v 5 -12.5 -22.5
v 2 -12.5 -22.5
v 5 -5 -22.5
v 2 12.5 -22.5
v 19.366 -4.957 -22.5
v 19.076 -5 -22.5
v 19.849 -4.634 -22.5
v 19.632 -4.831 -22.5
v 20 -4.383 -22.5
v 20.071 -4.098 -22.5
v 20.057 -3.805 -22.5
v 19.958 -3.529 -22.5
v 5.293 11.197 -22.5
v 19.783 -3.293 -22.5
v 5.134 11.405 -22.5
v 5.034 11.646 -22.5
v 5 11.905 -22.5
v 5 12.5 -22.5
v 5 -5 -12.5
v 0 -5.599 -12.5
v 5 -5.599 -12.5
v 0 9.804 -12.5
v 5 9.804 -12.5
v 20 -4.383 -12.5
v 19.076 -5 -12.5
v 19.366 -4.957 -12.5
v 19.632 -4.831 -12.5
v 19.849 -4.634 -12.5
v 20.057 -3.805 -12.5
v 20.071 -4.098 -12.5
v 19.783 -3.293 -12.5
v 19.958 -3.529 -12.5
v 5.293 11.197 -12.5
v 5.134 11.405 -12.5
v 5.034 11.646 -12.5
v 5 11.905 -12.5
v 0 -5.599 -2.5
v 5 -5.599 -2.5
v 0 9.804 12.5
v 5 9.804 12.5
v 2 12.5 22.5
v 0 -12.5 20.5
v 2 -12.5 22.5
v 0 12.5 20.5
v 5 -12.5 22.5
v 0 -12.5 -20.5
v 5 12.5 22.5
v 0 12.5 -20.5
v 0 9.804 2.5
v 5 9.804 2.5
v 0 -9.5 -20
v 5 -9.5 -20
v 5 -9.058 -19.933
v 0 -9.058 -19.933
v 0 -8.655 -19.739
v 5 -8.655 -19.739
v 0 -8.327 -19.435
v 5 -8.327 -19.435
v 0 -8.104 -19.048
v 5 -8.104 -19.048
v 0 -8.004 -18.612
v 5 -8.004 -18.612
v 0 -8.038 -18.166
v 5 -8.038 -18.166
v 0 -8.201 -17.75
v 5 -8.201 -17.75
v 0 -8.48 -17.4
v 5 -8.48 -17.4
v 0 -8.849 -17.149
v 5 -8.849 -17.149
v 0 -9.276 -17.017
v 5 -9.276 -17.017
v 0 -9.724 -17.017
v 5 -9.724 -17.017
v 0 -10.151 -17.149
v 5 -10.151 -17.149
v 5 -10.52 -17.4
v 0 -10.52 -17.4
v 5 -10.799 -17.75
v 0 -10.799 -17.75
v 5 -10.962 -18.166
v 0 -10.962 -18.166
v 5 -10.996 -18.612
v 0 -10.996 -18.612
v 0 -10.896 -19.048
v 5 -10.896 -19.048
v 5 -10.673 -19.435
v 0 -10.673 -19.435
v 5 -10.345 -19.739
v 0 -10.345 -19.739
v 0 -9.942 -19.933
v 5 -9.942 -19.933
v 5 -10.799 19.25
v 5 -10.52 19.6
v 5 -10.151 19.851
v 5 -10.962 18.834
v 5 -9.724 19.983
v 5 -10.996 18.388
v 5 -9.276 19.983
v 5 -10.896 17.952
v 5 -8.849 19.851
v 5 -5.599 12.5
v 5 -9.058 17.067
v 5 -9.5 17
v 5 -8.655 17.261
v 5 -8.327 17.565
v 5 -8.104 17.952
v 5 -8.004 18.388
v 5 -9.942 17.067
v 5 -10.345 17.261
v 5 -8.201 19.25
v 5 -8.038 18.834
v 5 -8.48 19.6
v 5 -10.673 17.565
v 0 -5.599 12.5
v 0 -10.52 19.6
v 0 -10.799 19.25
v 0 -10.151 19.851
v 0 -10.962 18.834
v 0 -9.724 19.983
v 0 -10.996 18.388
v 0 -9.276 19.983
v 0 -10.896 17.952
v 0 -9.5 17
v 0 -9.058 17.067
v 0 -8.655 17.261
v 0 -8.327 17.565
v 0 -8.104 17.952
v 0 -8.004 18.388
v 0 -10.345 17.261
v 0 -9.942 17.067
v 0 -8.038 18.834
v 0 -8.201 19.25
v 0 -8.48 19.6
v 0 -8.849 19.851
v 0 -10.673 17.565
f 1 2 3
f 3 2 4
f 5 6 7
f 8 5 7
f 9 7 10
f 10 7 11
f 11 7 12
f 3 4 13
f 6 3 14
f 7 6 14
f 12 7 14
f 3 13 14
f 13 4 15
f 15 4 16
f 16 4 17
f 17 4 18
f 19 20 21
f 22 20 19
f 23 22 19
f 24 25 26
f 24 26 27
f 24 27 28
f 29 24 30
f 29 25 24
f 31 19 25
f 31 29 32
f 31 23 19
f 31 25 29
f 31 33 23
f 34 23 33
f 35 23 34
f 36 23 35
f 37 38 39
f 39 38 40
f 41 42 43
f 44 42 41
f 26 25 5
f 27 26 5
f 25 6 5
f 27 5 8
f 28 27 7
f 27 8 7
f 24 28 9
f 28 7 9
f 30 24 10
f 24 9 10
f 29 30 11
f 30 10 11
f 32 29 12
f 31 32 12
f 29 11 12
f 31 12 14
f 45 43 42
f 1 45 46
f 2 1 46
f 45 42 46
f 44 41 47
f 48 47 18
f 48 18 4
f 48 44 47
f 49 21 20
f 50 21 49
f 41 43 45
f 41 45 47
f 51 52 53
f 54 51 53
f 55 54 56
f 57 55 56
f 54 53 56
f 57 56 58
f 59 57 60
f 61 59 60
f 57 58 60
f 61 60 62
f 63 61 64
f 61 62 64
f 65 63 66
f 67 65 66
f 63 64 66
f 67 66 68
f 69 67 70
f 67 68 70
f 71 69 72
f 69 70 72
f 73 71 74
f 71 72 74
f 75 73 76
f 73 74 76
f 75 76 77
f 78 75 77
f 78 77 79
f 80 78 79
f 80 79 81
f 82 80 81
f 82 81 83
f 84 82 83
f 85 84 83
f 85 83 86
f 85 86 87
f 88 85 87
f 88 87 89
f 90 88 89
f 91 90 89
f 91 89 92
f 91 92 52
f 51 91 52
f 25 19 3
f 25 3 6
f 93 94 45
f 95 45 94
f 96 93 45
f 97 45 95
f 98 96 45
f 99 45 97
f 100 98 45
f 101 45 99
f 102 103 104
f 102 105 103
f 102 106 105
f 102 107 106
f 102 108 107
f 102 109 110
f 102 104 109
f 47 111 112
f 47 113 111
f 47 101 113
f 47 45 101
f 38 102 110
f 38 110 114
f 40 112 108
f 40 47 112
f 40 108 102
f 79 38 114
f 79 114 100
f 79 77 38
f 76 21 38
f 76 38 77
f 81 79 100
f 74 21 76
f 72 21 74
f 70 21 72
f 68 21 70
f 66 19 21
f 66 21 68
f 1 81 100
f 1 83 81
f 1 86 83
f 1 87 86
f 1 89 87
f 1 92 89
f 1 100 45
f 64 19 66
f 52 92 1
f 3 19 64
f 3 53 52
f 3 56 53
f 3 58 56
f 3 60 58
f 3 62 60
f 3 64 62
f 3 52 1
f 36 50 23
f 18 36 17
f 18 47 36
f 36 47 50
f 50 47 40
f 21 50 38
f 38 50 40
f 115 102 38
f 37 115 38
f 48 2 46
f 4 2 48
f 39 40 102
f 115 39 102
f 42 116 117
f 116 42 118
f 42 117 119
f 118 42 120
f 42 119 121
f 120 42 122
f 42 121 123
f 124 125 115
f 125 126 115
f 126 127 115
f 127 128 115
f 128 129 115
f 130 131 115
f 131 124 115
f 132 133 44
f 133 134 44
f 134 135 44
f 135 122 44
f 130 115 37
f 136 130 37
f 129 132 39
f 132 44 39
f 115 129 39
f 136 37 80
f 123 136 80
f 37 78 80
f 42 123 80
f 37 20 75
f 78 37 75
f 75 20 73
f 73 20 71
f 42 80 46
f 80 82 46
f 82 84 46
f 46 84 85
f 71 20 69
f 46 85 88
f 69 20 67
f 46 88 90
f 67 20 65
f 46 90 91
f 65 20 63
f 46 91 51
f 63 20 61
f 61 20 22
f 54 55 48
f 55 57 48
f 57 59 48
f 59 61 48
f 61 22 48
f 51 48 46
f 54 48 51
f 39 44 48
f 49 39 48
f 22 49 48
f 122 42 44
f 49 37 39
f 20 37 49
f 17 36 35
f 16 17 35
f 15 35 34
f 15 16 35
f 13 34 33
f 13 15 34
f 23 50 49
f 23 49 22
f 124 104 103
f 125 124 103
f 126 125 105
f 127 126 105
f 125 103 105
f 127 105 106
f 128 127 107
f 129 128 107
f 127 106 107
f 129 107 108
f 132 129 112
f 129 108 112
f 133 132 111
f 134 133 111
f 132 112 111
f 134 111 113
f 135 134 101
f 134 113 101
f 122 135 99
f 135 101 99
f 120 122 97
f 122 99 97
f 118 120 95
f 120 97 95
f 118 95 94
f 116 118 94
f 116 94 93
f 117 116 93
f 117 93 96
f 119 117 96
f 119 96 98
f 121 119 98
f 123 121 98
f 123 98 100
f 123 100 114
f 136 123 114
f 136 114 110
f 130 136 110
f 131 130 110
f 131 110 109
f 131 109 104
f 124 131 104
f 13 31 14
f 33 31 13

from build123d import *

# Parameters (mm, degrees)
SKETCH1_W           = 45
SKETCH1_H           = 25
BOSS_EXTRUDE1_DEPTH = 5
SKETCH2_R           = 1.5
CUT_EXTRUDE1_DEPTH  = 27.220221204
CUT_EXTRUDE2_DEPTH  = 27.220221204
CHAMFER2_SIZE       = 2
BOSS_EXTRUDE2_START = -10
BOSS_EXTRUDE2_DEPTH = 10
FILLET1_R           = 1


with BuildPart() as part:
    # Sketch1 → Boss-Extrude1 (new body)
    with BuildSketch(Plane(origin=(0, 0, 0), x_dir=(0, 0, -1), z_dir=(1, 0, 0))):
        Rectangle(SKETCH1_W, SKETCH1_H)
    extrude(amount=BOSS_EXTRUDE1_DEPTH)

    # Sketch2 → Cut-Extrude1 (cut, through all)
    with BuildSketch(Plane(origin=(5, 0, 0), x_dir=(0, 0, -1), z_dir=(1, 0, 0))):
        with Locations((-18.5, -9.5)):
            Circle(SKETCH2_R)
        with Locations((18.5, -9.5)):
            Circle(SKETCH2_R)
    extrude(amount=-CUT_EXTRUDE1_DEPTH, mode=Mode.SUBTRACT)

    # Sketch3 → Cut-Extrude2 (cut, through all)
    with BuildSketch(Plane(origin=(5, 0, 0), x_dir=(0, 0, -1), z_dir=(1, 0, 0))):
        Polygon((-12.5, 9.80361421), (-12.5, -5.599476508), (2.5, -5.599476508), align=None)
        Polygon((-2.5, 9.80361421), (12.5, 9.80361421), (12.5, -5.599476508), align=None)
    extrude(amount=-CUT_EXTRUDE2_DEPTH, mode=Mode.SUBTRACT)

    # Chamfer2
    chamfer2_edges = [part.edges().sort_by_distance(p)[0] for p in [
        (0, 0, 22.5),
        (0, 0, -22.5),
    ]]
    chamfer(chamfer2_edges, length=CHAMFER2_SIZE)

    # Sketch4 → Boss-Extrude2 (add)
    with BuildSketch(Plane(origin=(0, 0, -22.5), x_dir=(-1, 0, 0), z_dir=(0, 0, -1)).offset(BOSS_EXTRUDE2_START)):
        Polygon((-5, -5), (-21.490292585, -5), (-5, 11.490292585), align=None)
    extrude(amount=BOSS_EXTRUDE2_DEPTH)

    # Fillet1
    fillet1_edges = [part.edges().sort_by_distance(p)[0] for p in [
        (5, 11.490292585, -17.5),
        (21.490292585, -5, -17.5),
    ]]
    fillet(fillet1_edges, radius=FILLET1_R)


solid = part.part
